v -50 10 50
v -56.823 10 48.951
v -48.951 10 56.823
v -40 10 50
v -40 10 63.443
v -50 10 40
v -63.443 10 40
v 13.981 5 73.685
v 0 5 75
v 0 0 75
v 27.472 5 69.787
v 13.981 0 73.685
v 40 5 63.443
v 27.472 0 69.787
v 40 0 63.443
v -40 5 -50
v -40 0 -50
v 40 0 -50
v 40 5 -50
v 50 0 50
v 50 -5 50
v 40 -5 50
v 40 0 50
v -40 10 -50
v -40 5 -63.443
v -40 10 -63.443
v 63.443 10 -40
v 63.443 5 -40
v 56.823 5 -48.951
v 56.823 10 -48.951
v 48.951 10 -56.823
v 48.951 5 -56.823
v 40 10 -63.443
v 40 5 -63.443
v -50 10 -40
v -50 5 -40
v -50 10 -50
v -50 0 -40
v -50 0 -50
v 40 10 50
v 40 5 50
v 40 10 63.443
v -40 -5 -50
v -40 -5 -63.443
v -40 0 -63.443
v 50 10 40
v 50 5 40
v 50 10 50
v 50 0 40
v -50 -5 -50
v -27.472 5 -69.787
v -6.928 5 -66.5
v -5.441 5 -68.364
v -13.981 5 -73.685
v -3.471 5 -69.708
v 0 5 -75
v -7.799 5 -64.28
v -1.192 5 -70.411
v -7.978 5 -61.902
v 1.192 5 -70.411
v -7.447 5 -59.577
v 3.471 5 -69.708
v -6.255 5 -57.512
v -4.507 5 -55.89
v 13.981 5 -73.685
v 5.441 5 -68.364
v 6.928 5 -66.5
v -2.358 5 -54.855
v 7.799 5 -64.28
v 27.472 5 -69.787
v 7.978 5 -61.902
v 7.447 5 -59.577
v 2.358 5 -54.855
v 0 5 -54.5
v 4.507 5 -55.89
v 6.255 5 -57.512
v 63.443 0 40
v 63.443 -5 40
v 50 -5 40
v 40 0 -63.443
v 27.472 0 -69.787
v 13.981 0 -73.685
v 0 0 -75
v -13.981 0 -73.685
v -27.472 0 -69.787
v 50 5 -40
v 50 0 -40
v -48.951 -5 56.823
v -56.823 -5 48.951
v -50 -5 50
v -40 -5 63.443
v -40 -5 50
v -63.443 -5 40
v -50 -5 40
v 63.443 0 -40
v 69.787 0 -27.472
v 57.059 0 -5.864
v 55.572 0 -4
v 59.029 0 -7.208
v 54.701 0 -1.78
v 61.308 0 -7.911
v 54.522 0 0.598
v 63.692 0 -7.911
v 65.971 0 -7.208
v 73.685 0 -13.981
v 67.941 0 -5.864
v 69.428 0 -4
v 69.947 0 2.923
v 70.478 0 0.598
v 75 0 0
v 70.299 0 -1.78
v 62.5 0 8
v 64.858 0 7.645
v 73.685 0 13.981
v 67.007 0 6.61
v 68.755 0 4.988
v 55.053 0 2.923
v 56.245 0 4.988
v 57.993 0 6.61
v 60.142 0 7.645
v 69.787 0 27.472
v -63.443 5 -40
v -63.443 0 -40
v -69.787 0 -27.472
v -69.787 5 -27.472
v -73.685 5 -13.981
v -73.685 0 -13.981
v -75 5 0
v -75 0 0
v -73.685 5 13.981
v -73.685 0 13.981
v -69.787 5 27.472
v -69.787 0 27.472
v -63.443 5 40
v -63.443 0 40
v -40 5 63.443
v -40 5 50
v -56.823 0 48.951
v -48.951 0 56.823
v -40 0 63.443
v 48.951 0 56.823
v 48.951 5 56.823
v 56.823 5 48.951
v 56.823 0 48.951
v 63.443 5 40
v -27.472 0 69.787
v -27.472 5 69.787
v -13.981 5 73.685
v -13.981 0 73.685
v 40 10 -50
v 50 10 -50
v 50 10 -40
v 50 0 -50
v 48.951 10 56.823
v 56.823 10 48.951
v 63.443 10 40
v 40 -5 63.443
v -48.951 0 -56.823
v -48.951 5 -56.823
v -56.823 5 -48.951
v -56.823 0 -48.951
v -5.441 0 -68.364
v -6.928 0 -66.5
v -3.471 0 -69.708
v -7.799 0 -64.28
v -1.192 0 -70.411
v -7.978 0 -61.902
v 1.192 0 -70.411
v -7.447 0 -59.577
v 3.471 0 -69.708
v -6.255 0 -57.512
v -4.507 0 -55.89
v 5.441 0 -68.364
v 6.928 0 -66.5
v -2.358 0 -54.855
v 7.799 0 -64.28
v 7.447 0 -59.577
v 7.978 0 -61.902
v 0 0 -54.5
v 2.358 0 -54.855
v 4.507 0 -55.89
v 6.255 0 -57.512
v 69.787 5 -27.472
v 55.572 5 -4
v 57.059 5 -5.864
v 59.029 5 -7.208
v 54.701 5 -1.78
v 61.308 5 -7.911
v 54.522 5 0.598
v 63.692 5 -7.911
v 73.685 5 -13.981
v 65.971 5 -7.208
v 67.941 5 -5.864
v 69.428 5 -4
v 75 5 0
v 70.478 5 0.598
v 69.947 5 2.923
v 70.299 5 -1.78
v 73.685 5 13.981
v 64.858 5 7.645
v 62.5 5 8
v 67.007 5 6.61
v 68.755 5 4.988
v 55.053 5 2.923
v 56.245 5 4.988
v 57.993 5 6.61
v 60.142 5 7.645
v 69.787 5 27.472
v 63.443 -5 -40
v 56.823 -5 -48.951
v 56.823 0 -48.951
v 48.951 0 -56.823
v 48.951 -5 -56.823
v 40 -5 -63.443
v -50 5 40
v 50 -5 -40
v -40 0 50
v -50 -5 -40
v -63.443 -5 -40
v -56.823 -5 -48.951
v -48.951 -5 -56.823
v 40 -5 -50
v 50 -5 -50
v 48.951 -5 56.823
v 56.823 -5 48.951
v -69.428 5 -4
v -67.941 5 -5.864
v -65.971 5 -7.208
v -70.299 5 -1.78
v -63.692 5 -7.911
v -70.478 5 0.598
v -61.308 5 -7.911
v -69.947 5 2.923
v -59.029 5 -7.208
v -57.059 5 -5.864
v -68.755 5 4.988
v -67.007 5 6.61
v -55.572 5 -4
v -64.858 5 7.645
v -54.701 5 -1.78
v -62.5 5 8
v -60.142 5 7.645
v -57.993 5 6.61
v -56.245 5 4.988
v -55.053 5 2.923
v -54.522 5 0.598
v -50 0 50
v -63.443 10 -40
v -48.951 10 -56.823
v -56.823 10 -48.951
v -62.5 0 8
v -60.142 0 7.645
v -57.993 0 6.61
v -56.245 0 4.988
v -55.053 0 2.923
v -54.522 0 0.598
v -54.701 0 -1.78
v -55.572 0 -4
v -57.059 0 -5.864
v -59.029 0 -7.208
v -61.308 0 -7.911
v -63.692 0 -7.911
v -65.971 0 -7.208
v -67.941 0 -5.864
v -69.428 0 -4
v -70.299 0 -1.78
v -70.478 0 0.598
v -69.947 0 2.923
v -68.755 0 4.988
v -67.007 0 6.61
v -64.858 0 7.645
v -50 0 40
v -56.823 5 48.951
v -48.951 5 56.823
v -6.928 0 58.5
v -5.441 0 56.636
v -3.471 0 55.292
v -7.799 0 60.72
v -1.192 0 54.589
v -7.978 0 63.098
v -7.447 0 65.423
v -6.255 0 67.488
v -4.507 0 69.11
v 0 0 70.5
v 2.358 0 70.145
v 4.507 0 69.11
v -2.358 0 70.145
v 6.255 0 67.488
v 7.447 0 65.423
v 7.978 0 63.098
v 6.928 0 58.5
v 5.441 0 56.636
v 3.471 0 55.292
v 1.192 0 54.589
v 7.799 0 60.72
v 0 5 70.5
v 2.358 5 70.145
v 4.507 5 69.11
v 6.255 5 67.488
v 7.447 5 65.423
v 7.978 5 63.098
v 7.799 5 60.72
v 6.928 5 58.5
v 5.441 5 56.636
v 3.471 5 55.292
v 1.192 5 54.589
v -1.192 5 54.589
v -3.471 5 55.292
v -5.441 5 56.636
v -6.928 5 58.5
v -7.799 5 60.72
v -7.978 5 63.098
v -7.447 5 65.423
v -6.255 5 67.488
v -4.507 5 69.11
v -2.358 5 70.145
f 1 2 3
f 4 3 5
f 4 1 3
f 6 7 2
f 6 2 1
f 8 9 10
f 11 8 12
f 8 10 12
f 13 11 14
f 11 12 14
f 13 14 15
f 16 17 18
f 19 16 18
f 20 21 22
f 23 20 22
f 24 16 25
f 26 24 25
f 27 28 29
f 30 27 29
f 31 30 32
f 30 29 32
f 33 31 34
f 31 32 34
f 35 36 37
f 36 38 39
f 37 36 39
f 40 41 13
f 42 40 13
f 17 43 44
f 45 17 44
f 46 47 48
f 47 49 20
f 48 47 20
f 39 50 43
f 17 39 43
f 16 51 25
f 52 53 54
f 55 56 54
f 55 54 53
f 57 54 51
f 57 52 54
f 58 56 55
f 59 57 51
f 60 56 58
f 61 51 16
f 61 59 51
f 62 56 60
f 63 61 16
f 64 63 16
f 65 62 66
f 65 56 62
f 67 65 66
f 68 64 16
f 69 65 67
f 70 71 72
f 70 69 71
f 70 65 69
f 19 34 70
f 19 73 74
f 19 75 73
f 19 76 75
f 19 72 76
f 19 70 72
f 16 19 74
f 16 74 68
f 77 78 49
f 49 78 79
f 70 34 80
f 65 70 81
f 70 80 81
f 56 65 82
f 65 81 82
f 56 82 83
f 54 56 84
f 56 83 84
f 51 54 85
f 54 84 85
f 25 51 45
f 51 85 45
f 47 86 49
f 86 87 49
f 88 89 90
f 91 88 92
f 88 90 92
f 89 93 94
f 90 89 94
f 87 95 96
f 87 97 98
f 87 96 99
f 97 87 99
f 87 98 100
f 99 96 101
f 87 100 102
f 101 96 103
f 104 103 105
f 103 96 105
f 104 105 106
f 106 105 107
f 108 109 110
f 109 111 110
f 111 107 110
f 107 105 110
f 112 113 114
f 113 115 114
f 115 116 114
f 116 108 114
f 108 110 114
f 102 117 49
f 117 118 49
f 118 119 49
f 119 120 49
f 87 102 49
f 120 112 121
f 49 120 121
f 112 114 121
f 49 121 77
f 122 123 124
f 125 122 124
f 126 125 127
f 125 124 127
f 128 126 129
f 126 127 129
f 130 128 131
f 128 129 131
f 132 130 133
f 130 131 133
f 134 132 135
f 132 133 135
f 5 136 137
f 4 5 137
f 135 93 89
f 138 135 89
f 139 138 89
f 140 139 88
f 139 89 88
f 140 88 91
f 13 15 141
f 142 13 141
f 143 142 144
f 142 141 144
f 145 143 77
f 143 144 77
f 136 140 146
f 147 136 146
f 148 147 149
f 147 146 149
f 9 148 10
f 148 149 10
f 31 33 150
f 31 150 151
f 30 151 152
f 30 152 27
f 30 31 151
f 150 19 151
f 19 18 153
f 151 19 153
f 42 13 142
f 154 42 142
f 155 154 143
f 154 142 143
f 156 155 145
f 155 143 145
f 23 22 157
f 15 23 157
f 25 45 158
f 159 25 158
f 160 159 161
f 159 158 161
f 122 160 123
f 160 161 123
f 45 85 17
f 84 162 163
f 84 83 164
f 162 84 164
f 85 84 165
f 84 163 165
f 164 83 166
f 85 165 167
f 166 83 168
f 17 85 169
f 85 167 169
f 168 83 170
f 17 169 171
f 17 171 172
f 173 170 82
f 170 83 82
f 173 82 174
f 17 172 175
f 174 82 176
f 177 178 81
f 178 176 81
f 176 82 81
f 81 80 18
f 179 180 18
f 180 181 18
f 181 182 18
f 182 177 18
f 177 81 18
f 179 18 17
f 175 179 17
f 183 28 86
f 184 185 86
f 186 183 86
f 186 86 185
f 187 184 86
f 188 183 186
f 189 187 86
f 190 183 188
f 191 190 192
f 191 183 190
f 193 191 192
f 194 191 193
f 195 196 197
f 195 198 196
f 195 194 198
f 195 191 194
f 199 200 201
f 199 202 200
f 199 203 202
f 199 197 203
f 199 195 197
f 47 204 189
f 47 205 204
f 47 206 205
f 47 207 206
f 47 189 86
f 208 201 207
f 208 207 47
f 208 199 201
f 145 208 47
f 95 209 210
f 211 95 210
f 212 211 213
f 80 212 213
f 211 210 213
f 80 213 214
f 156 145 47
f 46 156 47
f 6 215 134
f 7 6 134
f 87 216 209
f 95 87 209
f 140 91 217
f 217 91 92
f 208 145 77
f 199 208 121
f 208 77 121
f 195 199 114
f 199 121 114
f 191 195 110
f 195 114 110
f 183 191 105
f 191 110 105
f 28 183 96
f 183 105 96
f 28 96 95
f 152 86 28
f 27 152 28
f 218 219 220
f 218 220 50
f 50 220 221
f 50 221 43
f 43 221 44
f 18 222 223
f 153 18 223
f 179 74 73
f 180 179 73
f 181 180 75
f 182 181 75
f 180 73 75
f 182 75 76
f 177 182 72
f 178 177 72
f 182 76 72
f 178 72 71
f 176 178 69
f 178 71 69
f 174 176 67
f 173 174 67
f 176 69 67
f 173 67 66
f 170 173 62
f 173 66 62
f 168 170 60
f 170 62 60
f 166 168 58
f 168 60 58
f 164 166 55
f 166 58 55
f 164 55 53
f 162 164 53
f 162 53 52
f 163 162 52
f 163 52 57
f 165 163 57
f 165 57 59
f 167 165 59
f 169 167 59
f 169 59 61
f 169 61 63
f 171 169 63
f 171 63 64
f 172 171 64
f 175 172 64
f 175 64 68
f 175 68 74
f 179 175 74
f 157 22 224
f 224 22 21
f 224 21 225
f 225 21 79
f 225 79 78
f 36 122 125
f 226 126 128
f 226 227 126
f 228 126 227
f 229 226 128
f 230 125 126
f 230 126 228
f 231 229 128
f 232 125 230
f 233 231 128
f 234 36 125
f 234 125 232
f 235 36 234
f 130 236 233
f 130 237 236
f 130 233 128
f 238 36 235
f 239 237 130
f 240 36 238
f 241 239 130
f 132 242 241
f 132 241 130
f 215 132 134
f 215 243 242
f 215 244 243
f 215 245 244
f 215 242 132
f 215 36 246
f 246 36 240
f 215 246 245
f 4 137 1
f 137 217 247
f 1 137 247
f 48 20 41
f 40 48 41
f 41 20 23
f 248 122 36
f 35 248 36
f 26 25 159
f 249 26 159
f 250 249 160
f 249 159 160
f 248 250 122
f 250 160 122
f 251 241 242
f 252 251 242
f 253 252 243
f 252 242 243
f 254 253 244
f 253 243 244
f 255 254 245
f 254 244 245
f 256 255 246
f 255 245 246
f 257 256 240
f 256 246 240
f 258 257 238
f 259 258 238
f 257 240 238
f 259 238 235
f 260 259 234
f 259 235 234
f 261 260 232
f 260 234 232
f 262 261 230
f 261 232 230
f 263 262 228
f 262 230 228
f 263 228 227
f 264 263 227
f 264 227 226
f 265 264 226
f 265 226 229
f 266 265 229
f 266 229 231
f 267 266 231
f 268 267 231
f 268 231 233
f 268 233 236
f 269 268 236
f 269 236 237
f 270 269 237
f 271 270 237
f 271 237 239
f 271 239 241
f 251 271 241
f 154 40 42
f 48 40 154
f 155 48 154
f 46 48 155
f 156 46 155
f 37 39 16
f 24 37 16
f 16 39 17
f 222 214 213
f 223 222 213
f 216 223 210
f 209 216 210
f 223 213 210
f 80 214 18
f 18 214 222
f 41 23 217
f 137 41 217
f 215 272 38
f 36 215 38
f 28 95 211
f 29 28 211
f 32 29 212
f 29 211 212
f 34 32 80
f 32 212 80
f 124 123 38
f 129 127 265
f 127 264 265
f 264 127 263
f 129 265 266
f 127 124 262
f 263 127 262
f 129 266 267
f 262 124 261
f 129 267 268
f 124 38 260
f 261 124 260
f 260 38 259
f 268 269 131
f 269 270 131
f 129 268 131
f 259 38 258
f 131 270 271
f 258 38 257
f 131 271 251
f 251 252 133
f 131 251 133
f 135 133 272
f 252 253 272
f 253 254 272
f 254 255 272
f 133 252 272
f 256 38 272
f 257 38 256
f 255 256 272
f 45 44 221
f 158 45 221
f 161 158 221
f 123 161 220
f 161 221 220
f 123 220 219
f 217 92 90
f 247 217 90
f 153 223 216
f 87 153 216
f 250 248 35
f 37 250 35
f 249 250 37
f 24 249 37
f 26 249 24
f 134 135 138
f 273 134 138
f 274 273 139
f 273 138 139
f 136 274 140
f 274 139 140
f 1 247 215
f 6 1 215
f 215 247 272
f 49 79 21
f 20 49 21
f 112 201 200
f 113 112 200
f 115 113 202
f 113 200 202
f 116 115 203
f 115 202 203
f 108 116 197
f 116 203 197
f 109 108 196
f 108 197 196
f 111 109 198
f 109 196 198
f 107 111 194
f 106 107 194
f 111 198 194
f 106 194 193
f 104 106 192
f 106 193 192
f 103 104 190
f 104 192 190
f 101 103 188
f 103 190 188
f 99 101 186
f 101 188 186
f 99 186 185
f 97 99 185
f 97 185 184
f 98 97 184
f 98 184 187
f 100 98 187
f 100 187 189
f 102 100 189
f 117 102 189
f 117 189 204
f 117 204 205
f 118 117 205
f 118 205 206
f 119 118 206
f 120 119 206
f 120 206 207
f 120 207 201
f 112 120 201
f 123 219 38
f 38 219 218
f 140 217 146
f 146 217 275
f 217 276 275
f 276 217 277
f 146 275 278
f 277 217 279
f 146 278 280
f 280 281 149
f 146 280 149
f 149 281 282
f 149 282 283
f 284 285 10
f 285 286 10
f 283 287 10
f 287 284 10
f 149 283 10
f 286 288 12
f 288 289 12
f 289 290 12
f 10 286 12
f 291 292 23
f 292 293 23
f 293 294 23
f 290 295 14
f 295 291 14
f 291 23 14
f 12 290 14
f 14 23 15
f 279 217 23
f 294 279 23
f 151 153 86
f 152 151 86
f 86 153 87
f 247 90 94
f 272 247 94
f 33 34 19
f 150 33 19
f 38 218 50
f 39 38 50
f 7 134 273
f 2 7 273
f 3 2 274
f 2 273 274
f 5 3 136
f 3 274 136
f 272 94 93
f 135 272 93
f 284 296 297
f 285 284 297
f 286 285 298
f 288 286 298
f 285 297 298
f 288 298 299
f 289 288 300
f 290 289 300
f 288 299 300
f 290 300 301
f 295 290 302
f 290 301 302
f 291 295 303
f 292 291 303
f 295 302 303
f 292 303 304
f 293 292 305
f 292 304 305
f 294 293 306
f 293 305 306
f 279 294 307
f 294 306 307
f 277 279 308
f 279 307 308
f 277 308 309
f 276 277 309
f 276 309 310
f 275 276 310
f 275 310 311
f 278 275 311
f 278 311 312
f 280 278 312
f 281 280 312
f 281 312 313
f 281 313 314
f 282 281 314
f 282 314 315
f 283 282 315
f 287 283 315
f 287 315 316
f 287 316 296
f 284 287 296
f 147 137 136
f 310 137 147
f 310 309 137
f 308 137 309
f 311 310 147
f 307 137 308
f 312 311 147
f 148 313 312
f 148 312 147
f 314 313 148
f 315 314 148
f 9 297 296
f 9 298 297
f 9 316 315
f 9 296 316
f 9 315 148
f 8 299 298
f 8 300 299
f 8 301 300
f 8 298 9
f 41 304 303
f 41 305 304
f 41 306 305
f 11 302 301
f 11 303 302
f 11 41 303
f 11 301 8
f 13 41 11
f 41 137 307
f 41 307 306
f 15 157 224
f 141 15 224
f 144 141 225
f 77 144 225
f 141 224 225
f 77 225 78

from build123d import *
from build123d.topology import SkipClean

# Parameters (mm, degrees)
SKETCH1_R           = 75
SKETCH1_W           = 100
SKETCH1_H           = 100
BOSS_EXTRUDE1_DEPTH = 5
SKETCH2_R           = 8
CUT_EXTRUDE1_DEPTH  = 10
BOSS_EXTRUDE2_DEPTH = 5
BOSS_EXTRUDE4_START = -15
BOSS_EXTRUDE4_DEPTH = 15


with BuildPart() as part:
    # Sketch1 → Boss-Extrude1 (new body)
    with BuildSketch(Plane(origin=(0, 0, 0), x_dir=(1, 0, 0), z_dir=(0, 1, 0))):
        with Locations(Location((0, 0, 0), (0, 0, 270))):
            Circle(SKETCH1_R)
        Rectangle(SKETCH1_W, SKETCH1_H, mode=Mode.SUBTRACT)
    extrude(amount=BOSS_EXTRUDE1_DEPTH)

    # Sketch2 → Cut-Extrude1 (cut)
    with BuildSketch(Plane(origin=(0, 5, 0), x_dir=(1, 0, 0), z_dir=(0, 1, 0))):
        with Locations(Location((-62.5, 0, 0), (0, 0, 270))):
            Circle(SKETCH2_R)
        with Locations(Location((0, 62.5, 0), (0, 0, 270))):
            Circle(SKETCH2_R)
        with Locations(Location((62.5, 0, 0), (0, 0, 270))):
            Circle(SKETCH2_R)
        with Locations(Location((0, -62.5, 0), (0, 0, 270))):
            Circle(SKETCH2_R)
    extrude(amount=-CUT_EXTRUDE1_DEPTH, mode=Mode.SUBTRACT)

    # Sketch3 → Boss-Extrude2 (add)
    with BuildSketch(Plane(origin=(0, 5, 0), x_dir=(1, 0, 0), z_dir=(0, 1, 0))):
        with BuildLine():
            Line((50, -50), (40, -50))
            Line((40, -50), (40, -63.442887702))
            ThreePointArc((40, -63.442887702), (53.033008589, -53.033008589), (63.442887702, -40))
            Line((63.442887702, -40), (50, -40))
            Line((50, -40), (50, -50))
        make_face()
        with BuildLine():
            Line((-40, -50), (-50, -50))
            Line((-50, -50), (-50, -40))
            Line((-50, -40), (-63.442887702, -40))
            ThreePointArc((-63.442887702, -40), (-53.033008589, -53.033008589), (-40, -63.442887702))
            Line((-40, -63.442887702), (-40, -50))
        make_face()
        with BuildLine():
            Line((-63.442887702, 40), (-50, 40))
            Line((-50, 40), (-50, 50))
            Line((-50, 50), (-40, 50))
            Line((-40, 50), (-40, 63.442887702))
            ThreePointArc((-40, 63.442887702), (-53.033008589, 53.033008589), (-63.442887702, 40))
        make_face()
        with BuildLine():
            Line((50, 50), (50, 40))
            Line((50, 40), (63.442887702, 40))
            ThreePointArc((63.442887702, 40), (53.033008589, 53.033008589), (40, 63.442887702))
            Line((40, 63.442887702), (40, 50))
            Line((40, 50), (50, 50))
        make_face()
    extrude(amount=BOSS_EXTRUDE2_DEPTH)

    # Sketch4 → Boss-Extrude4 (add)
    with SkipClean():  # the faces are left unmerged after this step: merging them gives an invalid solid
        with BuildSketch(Plane(origin=(0, 10, 0), x_dir=(1, 0, 0), z_dir=(0, 1, 0)).offset(BOSS_EXTRUDE4_START)):
            with BuildLine():
                Line((50, 50), (50, 40))
                Line((50, 40), (63.442887702, 40))
                ThreePointArc((63.442887702, 40), (53.033008589, 53.033008589), (40, 63.442887702))
                Line((40, 63.442887702), (40, 50))
                Line((40, 50), (50, 50))
            make_face()
            with BuildLine():
                Line((-50, 50), (-40, 50))
                Line((-40, 50), (-40, 63.442887702))
                ThreePointArc((-40, 63.442887702), (-53.033008589, 53.033008589), (-63.442887702, 40))
                Line((-63.442887702, 40), (-50, 40))
                Line((-50, 40), (-50, 50))
            make_face()
            with BuildLine():
                Line((-40, -63.442887702), (-40, -50))
                Line((-40, -50), (-50, -50))
                Line((-50, -50), (-50, -40))
                Line((-50, -40), (-63.442887702, -40))
                ThreePointArc((-63.442887702, -40), (-53.033008589, -53.033008589), (-40, -63.442887702))
            make_face()
            with BuildLine():
                Line((50, -50), (40, -50))
                Line((40, -50), (40, -63.442887702))
                ThreePointArc((40, -63.442887702), (53.033008589, -53.033008589), (63.442887702, -40))
                Line((63.442887702, -40), (50, -40))
                Line((50, -40), (50, -50))
            make_face()
        extrude(amount=BOSS_EXTRUDE4_DEPTH)


solid = part.part
